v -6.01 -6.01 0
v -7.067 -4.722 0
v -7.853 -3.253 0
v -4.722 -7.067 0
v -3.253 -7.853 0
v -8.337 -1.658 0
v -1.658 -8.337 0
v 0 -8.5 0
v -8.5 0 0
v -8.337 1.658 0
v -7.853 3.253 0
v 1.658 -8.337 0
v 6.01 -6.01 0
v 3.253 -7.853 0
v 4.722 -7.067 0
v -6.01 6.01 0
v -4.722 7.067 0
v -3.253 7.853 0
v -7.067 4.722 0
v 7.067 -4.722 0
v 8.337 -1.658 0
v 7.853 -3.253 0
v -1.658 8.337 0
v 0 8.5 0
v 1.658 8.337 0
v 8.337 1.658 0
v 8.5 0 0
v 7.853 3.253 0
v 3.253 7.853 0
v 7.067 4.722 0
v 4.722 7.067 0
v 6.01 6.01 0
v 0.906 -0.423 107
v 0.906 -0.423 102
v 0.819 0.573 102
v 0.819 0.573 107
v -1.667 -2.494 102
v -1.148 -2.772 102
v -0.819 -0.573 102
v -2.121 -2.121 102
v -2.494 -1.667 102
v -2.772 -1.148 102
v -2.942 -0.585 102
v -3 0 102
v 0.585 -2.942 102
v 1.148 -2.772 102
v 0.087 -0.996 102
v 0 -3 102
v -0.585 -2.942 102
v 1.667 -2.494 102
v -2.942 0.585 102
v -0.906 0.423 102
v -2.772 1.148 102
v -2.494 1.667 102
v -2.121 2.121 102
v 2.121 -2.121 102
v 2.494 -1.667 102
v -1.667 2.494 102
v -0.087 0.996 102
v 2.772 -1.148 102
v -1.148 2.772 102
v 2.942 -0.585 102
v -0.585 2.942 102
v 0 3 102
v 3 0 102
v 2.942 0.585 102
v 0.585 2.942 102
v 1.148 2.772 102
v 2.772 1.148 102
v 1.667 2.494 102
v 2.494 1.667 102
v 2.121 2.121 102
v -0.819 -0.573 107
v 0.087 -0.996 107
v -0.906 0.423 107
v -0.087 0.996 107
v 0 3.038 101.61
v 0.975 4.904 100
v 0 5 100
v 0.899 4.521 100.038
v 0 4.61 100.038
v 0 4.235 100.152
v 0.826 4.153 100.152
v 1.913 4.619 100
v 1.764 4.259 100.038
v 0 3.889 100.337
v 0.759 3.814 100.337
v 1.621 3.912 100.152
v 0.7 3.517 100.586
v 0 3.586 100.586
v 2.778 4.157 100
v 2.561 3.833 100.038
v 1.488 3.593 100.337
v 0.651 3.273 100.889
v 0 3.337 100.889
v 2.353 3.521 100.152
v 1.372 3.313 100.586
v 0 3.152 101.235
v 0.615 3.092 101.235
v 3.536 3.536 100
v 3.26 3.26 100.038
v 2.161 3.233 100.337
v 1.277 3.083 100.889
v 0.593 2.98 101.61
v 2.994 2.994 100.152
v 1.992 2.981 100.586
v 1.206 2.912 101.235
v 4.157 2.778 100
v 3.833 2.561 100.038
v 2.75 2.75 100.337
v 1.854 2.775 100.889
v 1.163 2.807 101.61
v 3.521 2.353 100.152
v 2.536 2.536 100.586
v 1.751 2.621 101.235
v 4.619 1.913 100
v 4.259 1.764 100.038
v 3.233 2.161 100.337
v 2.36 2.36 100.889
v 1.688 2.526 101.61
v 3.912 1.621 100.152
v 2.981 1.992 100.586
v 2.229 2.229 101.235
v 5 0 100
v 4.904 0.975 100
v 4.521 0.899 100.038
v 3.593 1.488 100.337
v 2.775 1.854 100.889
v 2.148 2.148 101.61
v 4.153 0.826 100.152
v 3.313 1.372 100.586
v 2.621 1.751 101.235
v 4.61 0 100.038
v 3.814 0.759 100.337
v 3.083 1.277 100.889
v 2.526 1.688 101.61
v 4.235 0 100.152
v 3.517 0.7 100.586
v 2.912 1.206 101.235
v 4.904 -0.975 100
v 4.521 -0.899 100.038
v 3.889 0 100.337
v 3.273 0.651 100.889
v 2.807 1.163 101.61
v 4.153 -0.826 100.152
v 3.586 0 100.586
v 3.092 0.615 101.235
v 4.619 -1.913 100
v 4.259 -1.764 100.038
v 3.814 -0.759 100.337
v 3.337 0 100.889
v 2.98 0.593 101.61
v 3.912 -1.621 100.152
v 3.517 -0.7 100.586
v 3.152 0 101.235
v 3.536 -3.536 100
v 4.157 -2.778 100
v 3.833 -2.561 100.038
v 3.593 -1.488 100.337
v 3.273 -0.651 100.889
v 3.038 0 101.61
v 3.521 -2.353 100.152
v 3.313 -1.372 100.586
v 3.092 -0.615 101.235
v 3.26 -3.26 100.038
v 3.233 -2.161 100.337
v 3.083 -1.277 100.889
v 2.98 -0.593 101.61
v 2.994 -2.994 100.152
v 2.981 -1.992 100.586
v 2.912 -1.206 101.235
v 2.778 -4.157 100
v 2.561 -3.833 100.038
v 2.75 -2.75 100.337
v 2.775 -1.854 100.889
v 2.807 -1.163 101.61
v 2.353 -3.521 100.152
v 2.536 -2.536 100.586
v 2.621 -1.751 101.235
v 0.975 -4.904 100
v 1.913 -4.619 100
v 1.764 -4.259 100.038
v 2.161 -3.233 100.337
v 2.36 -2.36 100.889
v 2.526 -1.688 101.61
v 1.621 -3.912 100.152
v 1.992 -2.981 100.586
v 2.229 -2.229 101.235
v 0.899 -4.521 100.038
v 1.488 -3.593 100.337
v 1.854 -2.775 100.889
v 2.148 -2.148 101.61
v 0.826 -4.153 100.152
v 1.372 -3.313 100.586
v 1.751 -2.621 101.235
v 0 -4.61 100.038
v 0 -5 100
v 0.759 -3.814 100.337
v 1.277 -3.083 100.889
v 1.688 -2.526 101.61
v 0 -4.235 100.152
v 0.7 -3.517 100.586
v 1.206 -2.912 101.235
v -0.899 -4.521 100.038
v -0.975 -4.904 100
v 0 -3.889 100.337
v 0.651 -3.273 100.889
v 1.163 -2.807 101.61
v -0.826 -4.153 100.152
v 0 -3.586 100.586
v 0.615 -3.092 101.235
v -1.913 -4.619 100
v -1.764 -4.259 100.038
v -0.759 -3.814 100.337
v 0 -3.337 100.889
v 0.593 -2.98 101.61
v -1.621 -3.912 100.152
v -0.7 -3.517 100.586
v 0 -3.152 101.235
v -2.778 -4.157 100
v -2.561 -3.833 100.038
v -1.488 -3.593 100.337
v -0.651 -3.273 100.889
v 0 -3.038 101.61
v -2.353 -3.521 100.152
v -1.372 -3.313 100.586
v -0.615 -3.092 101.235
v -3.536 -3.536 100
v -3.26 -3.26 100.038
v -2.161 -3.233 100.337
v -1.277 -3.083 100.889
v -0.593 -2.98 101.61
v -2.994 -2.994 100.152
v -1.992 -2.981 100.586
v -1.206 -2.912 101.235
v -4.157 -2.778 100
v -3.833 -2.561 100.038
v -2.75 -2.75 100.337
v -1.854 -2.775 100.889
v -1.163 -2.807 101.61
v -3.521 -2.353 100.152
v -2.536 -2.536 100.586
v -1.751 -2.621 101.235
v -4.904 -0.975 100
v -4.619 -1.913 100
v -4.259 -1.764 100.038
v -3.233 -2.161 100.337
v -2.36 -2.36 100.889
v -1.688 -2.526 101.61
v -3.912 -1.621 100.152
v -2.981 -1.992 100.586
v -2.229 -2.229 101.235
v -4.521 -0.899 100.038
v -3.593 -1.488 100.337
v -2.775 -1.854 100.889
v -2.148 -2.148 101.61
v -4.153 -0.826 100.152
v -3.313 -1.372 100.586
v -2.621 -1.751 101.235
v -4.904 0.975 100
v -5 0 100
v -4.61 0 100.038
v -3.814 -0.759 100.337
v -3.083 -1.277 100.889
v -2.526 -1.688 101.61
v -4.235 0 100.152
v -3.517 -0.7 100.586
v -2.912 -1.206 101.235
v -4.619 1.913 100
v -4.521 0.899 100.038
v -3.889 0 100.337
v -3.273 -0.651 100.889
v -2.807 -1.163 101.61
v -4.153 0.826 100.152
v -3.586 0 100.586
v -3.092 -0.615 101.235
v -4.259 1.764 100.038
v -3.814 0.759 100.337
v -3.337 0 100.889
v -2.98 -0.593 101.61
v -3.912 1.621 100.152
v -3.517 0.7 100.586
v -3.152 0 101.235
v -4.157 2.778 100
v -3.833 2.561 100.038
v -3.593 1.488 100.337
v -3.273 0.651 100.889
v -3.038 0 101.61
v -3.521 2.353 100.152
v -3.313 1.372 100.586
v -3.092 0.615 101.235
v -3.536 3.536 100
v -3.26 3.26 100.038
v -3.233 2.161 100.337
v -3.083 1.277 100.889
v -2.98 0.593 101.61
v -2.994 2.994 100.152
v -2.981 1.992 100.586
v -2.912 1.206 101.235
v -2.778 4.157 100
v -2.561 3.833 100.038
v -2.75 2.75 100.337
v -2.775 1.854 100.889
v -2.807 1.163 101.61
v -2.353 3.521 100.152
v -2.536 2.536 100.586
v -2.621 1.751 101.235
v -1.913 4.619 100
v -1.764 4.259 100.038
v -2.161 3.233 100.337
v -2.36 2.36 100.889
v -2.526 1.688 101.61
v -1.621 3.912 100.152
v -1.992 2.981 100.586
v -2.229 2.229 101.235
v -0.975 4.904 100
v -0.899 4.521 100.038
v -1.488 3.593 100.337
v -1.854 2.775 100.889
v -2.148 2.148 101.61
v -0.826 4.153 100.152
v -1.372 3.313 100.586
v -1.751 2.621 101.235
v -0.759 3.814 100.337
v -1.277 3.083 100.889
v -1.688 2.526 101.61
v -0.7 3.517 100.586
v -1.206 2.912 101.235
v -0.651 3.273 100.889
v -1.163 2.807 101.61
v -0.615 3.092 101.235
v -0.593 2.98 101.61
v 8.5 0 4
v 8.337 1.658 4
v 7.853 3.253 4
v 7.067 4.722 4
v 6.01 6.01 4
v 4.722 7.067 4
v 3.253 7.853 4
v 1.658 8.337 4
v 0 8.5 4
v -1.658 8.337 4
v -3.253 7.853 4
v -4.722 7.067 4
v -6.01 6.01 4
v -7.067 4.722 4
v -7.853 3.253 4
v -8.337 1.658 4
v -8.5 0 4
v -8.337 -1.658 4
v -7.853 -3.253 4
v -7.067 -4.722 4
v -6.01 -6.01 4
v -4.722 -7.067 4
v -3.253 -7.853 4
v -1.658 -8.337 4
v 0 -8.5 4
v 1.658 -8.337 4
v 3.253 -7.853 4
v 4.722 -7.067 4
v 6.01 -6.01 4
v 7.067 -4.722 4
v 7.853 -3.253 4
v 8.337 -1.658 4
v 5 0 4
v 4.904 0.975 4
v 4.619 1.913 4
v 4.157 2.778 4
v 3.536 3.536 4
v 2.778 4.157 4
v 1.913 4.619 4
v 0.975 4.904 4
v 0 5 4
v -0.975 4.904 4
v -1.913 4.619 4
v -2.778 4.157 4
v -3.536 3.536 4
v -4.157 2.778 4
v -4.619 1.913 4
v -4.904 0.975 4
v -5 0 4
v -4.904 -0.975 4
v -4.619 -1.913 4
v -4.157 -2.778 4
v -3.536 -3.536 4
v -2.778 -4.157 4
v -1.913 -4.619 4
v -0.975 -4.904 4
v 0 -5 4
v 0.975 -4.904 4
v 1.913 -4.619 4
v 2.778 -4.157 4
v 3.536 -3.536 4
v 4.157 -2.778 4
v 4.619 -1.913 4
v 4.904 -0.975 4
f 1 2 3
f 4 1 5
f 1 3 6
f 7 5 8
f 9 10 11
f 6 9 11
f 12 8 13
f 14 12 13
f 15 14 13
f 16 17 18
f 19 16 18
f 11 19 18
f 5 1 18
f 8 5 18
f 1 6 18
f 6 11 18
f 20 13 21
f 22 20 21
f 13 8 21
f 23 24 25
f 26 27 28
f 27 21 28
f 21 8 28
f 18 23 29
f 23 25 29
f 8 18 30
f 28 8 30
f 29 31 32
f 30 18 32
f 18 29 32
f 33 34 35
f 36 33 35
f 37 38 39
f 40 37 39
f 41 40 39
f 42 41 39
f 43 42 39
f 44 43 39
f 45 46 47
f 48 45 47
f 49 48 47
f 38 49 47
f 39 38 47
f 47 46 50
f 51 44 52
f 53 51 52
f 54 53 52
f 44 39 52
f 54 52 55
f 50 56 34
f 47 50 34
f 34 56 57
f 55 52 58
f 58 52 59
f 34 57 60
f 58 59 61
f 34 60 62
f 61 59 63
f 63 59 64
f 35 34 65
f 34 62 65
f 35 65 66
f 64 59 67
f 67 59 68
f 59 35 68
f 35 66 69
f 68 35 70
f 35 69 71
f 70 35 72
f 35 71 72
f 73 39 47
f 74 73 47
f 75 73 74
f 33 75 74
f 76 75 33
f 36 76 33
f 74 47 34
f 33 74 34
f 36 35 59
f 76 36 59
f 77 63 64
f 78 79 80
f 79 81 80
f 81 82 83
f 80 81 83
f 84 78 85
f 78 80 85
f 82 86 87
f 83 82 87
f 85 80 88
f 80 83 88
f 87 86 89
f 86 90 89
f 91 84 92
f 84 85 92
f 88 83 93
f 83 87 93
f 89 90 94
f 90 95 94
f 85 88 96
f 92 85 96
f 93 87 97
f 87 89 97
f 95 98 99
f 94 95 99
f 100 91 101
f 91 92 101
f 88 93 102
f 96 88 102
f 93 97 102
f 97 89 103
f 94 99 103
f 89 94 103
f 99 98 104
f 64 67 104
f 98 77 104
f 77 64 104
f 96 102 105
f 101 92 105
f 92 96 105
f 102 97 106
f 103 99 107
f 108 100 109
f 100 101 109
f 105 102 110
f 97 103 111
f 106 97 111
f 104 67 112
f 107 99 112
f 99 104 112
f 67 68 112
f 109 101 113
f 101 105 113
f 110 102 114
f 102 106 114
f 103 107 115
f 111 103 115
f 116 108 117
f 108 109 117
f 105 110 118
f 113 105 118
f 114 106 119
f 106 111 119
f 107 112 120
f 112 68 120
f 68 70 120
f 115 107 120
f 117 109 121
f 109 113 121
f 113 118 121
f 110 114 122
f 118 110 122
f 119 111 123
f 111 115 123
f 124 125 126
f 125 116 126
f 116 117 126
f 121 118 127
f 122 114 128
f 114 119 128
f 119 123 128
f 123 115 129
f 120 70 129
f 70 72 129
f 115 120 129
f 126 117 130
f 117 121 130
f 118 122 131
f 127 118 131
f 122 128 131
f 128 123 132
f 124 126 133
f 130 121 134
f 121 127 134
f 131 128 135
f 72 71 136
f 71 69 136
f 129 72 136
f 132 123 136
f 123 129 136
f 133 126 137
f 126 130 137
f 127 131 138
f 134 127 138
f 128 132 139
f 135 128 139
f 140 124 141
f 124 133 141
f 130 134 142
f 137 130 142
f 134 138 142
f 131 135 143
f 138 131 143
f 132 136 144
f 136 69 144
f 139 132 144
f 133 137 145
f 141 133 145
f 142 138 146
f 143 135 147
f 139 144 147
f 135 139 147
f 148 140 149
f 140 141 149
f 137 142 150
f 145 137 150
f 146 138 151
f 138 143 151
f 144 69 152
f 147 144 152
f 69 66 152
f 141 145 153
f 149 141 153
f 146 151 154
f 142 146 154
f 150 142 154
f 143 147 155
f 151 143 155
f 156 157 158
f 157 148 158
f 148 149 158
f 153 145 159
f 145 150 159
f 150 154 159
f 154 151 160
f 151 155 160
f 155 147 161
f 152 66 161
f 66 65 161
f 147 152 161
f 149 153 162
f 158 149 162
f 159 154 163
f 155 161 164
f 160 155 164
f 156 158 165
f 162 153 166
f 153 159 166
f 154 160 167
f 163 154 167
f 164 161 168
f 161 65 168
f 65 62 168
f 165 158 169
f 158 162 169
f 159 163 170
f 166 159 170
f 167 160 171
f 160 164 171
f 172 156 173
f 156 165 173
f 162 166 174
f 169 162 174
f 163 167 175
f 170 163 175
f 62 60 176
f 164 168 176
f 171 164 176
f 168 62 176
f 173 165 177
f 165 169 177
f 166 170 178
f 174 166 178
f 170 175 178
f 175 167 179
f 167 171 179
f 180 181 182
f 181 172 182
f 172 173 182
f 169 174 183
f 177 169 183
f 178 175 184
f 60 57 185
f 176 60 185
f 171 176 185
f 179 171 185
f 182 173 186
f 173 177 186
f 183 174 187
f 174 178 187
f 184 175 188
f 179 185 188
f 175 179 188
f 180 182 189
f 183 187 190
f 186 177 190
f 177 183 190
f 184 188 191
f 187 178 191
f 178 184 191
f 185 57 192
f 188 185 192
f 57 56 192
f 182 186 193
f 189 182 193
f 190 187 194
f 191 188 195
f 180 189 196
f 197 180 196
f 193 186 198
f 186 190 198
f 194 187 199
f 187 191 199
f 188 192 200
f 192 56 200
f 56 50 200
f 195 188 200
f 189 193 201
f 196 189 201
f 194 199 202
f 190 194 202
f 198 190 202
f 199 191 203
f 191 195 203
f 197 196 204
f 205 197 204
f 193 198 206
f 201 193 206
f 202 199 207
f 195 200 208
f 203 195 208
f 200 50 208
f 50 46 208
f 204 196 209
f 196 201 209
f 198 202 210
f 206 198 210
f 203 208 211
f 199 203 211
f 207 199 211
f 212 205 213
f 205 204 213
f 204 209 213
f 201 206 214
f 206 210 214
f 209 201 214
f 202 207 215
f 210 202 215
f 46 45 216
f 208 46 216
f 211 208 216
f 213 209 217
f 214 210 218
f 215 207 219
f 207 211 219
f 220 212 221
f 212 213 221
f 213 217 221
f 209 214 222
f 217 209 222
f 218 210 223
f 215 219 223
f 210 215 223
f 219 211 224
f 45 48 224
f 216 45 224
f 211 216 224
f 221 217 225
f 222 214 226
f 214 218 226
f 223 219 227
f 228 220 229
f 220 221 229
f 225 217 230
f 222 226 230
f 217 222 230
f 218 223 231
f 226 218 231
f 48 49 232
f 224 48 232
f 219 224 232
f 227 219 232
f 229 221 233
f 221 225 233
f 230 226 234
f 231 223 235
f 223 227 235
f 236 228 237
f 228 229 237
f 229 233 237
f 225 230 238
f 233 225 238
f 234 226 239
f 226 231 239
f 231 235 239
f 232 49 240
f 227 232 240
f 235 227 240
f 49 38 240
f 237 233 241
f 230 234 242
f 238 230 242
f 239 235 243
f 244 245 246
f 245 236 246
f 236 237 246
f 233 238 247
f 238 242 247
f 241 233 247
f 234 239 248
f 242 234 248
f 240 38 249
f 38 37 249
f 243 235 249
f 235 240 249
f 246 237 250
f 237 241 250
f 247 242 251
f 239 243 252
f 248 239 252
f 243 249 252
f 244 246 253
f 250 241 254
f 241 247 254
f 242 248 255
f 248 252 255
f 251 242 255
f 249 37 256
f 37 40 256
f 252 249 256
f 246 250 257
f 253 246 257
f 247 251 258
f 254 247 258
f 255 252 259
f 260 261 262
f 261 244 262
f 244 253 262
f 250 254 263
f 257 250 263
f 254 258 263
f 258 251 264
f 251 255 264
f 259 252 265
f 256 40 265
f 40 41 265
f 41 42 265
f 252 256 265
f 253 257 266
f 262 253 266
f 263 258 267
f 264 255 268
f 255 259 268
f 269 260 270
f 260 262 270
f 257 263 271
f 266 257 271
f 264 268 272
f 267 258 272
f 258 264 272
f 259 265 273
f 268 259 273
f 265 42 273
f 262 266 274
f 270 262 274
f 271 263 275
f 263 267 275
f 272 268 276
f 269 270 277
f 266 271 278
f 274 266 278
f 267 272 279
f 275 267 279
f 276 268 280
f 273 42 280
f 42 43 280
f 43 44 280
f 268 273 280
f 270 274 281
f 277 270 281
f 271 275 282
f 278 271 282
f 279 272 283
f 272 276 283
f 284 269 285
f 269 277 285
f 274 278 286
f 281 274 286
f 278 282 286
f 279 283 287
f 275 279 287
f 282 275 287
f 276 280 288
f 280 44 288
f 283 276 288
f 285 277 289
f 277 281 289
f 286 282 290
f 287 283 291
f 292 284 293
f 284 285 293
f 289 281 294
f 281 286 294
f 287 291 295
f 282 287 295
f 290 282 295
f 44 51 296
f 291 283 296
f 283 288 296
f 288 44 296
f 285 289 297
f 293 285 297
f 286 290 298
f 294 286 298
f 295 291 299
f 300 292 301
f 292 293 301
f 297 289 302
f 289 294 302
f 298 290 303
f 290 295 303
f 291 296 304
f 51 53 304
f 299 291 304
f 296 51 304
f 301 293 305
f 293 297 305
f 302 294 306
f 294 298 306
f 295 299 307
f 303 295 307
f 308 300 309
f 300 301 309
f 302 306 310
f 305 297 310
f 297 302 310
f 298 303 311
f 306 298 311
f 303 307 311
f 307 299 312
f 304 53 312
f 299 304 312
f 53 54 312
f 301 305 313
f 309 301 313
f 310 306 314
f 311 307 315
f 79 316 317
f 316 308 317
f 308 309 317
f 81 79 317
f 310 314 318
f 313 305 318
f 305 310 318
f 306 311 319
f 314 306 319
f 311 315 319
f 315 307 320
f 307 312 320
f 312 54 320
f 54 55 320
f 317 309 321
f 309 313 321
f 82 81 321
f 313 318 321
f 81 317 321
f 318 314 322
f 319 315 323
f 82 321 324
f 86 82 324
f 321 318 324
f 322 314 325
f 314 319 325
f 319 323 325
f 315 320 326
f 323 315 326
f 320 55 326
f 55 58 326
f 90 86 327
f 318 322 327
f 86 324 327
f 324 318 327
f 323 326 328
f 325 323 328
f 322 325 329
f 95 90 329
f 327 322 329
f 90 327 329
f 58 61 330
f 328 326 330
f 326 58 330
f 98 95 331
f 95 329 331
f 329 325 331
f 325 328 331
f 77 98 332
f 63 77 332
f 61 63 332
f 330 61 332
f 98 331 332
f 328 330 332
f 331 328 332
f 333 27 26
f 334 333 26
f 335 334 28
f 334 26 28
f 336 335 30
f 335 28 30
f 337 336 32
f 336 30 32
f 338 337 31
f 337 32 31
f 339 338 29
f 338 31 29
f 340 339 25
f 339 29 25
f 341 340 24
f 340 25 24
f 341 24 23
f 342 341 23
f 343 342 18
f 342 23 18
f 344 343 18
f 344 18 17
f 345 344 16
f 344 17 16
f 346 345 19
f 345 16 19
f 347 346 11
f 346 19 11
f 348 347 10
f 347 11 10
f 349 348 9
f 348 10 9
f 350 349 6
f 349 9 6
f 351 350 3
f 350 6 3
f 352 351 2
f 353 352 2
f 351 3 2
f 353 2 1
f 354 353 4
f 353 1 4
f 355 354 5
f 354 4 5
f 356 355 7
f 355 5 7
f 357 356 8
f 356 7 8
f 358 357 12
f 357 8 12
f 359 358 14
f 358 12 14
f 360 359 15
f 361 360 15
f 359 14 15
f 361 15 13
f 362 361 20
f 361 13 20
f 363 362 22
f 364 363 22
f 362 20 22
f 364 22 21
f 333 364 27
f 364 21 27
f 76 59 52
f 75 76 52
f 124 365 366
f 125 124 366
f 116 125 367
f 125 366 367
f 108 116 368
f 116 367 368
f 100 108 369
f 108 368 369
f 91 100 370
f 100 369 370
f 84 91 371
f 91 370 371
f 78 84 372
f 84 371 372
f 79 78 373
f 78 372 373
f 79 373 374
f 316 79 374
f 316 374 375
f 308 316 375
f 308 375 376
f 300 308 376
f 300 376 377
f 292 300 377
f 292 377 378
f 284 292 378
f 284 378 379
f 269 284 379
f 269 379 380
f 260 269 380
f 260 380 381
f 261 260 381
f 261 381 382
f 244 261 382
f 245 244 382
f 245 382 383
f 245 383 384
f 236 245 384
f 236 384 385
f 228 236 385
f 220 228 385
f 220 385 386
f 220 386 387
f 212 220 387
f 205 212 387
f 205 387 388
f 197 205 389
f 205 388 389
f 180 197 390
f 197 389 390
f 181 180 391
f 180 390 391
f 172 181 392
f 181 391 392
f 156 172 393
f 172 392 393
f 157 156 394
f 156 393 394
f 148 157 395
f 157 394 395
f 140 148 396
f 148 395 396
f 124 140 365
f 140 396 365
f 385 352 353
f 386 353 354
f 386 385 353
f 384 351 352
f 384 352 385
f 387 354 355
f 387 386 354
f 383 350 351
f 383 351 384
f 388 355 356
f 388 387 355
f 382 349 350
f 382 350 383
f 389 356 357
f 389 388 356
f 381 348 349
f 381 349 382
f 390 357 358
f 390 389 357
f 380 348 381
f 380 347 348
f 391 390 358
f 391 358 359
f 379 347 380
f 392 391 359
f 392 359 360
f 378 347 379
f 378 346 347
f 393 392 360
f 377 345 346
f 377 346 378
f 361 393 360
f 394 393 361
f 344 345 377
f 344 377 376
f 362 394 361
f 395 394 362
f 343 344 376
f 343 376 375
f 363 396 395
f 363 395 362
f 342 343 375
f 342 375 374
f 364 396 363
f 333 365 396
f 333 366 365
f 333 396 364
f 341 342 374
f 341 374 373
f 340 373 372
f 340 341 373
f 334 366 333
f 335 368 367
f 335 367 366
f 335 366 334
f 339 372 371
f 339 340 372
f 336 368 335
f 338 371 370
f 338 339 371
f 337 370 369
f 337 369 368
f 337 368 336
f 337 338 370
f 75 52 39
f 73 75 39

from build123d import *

# Parameters (mm, degrees)
F0_R     = 8.5
F1_DEPTH = 4
F2_R     = 5
F3_DEPTH = 100
F7_DEPTH = 5


with BuildPart() as f1:
    # F0 (on Top) → F1 (new body)
    with BuildSketch(Plane.XY):
        Circle(F0_R)
    extrude(amount=F1_DEPTH)

    # F2 (on Top) → F3 (join)
    with BuildSketch(Plane.XY):
        Circle(F2_R)
    extrude(amount=F3_DEPTH)

    # F4 (on Right) → F5 (revolve)
    with BuildSketch(Plane.YZ):
        with BuildLine():
            Line((3, 102), (0, 102))
            Line((0, 102), (0, 100))
            Line((0, 100), (5, 100))
            ThreePointArc((5, 100), (3.585786, 100.585786), (3, 102))
        make_face()
    revolve(axis=Axis((0, 0, 101), (0, 0, -1)))

    # F6 (on face) → F7 (join)
    with BuildSketch(Plane.XY.offset(102)):
        Polygon((0.087017, -0.996207), (0.906249, -0.422744), (0.819232, 0.573463), (-0.087017, 0.996207), (-0.906249, 0.422744), (-0.819232, -0.573463), align=None)
    extrude(amount=F7_DEPTH)


solid = f1.part
